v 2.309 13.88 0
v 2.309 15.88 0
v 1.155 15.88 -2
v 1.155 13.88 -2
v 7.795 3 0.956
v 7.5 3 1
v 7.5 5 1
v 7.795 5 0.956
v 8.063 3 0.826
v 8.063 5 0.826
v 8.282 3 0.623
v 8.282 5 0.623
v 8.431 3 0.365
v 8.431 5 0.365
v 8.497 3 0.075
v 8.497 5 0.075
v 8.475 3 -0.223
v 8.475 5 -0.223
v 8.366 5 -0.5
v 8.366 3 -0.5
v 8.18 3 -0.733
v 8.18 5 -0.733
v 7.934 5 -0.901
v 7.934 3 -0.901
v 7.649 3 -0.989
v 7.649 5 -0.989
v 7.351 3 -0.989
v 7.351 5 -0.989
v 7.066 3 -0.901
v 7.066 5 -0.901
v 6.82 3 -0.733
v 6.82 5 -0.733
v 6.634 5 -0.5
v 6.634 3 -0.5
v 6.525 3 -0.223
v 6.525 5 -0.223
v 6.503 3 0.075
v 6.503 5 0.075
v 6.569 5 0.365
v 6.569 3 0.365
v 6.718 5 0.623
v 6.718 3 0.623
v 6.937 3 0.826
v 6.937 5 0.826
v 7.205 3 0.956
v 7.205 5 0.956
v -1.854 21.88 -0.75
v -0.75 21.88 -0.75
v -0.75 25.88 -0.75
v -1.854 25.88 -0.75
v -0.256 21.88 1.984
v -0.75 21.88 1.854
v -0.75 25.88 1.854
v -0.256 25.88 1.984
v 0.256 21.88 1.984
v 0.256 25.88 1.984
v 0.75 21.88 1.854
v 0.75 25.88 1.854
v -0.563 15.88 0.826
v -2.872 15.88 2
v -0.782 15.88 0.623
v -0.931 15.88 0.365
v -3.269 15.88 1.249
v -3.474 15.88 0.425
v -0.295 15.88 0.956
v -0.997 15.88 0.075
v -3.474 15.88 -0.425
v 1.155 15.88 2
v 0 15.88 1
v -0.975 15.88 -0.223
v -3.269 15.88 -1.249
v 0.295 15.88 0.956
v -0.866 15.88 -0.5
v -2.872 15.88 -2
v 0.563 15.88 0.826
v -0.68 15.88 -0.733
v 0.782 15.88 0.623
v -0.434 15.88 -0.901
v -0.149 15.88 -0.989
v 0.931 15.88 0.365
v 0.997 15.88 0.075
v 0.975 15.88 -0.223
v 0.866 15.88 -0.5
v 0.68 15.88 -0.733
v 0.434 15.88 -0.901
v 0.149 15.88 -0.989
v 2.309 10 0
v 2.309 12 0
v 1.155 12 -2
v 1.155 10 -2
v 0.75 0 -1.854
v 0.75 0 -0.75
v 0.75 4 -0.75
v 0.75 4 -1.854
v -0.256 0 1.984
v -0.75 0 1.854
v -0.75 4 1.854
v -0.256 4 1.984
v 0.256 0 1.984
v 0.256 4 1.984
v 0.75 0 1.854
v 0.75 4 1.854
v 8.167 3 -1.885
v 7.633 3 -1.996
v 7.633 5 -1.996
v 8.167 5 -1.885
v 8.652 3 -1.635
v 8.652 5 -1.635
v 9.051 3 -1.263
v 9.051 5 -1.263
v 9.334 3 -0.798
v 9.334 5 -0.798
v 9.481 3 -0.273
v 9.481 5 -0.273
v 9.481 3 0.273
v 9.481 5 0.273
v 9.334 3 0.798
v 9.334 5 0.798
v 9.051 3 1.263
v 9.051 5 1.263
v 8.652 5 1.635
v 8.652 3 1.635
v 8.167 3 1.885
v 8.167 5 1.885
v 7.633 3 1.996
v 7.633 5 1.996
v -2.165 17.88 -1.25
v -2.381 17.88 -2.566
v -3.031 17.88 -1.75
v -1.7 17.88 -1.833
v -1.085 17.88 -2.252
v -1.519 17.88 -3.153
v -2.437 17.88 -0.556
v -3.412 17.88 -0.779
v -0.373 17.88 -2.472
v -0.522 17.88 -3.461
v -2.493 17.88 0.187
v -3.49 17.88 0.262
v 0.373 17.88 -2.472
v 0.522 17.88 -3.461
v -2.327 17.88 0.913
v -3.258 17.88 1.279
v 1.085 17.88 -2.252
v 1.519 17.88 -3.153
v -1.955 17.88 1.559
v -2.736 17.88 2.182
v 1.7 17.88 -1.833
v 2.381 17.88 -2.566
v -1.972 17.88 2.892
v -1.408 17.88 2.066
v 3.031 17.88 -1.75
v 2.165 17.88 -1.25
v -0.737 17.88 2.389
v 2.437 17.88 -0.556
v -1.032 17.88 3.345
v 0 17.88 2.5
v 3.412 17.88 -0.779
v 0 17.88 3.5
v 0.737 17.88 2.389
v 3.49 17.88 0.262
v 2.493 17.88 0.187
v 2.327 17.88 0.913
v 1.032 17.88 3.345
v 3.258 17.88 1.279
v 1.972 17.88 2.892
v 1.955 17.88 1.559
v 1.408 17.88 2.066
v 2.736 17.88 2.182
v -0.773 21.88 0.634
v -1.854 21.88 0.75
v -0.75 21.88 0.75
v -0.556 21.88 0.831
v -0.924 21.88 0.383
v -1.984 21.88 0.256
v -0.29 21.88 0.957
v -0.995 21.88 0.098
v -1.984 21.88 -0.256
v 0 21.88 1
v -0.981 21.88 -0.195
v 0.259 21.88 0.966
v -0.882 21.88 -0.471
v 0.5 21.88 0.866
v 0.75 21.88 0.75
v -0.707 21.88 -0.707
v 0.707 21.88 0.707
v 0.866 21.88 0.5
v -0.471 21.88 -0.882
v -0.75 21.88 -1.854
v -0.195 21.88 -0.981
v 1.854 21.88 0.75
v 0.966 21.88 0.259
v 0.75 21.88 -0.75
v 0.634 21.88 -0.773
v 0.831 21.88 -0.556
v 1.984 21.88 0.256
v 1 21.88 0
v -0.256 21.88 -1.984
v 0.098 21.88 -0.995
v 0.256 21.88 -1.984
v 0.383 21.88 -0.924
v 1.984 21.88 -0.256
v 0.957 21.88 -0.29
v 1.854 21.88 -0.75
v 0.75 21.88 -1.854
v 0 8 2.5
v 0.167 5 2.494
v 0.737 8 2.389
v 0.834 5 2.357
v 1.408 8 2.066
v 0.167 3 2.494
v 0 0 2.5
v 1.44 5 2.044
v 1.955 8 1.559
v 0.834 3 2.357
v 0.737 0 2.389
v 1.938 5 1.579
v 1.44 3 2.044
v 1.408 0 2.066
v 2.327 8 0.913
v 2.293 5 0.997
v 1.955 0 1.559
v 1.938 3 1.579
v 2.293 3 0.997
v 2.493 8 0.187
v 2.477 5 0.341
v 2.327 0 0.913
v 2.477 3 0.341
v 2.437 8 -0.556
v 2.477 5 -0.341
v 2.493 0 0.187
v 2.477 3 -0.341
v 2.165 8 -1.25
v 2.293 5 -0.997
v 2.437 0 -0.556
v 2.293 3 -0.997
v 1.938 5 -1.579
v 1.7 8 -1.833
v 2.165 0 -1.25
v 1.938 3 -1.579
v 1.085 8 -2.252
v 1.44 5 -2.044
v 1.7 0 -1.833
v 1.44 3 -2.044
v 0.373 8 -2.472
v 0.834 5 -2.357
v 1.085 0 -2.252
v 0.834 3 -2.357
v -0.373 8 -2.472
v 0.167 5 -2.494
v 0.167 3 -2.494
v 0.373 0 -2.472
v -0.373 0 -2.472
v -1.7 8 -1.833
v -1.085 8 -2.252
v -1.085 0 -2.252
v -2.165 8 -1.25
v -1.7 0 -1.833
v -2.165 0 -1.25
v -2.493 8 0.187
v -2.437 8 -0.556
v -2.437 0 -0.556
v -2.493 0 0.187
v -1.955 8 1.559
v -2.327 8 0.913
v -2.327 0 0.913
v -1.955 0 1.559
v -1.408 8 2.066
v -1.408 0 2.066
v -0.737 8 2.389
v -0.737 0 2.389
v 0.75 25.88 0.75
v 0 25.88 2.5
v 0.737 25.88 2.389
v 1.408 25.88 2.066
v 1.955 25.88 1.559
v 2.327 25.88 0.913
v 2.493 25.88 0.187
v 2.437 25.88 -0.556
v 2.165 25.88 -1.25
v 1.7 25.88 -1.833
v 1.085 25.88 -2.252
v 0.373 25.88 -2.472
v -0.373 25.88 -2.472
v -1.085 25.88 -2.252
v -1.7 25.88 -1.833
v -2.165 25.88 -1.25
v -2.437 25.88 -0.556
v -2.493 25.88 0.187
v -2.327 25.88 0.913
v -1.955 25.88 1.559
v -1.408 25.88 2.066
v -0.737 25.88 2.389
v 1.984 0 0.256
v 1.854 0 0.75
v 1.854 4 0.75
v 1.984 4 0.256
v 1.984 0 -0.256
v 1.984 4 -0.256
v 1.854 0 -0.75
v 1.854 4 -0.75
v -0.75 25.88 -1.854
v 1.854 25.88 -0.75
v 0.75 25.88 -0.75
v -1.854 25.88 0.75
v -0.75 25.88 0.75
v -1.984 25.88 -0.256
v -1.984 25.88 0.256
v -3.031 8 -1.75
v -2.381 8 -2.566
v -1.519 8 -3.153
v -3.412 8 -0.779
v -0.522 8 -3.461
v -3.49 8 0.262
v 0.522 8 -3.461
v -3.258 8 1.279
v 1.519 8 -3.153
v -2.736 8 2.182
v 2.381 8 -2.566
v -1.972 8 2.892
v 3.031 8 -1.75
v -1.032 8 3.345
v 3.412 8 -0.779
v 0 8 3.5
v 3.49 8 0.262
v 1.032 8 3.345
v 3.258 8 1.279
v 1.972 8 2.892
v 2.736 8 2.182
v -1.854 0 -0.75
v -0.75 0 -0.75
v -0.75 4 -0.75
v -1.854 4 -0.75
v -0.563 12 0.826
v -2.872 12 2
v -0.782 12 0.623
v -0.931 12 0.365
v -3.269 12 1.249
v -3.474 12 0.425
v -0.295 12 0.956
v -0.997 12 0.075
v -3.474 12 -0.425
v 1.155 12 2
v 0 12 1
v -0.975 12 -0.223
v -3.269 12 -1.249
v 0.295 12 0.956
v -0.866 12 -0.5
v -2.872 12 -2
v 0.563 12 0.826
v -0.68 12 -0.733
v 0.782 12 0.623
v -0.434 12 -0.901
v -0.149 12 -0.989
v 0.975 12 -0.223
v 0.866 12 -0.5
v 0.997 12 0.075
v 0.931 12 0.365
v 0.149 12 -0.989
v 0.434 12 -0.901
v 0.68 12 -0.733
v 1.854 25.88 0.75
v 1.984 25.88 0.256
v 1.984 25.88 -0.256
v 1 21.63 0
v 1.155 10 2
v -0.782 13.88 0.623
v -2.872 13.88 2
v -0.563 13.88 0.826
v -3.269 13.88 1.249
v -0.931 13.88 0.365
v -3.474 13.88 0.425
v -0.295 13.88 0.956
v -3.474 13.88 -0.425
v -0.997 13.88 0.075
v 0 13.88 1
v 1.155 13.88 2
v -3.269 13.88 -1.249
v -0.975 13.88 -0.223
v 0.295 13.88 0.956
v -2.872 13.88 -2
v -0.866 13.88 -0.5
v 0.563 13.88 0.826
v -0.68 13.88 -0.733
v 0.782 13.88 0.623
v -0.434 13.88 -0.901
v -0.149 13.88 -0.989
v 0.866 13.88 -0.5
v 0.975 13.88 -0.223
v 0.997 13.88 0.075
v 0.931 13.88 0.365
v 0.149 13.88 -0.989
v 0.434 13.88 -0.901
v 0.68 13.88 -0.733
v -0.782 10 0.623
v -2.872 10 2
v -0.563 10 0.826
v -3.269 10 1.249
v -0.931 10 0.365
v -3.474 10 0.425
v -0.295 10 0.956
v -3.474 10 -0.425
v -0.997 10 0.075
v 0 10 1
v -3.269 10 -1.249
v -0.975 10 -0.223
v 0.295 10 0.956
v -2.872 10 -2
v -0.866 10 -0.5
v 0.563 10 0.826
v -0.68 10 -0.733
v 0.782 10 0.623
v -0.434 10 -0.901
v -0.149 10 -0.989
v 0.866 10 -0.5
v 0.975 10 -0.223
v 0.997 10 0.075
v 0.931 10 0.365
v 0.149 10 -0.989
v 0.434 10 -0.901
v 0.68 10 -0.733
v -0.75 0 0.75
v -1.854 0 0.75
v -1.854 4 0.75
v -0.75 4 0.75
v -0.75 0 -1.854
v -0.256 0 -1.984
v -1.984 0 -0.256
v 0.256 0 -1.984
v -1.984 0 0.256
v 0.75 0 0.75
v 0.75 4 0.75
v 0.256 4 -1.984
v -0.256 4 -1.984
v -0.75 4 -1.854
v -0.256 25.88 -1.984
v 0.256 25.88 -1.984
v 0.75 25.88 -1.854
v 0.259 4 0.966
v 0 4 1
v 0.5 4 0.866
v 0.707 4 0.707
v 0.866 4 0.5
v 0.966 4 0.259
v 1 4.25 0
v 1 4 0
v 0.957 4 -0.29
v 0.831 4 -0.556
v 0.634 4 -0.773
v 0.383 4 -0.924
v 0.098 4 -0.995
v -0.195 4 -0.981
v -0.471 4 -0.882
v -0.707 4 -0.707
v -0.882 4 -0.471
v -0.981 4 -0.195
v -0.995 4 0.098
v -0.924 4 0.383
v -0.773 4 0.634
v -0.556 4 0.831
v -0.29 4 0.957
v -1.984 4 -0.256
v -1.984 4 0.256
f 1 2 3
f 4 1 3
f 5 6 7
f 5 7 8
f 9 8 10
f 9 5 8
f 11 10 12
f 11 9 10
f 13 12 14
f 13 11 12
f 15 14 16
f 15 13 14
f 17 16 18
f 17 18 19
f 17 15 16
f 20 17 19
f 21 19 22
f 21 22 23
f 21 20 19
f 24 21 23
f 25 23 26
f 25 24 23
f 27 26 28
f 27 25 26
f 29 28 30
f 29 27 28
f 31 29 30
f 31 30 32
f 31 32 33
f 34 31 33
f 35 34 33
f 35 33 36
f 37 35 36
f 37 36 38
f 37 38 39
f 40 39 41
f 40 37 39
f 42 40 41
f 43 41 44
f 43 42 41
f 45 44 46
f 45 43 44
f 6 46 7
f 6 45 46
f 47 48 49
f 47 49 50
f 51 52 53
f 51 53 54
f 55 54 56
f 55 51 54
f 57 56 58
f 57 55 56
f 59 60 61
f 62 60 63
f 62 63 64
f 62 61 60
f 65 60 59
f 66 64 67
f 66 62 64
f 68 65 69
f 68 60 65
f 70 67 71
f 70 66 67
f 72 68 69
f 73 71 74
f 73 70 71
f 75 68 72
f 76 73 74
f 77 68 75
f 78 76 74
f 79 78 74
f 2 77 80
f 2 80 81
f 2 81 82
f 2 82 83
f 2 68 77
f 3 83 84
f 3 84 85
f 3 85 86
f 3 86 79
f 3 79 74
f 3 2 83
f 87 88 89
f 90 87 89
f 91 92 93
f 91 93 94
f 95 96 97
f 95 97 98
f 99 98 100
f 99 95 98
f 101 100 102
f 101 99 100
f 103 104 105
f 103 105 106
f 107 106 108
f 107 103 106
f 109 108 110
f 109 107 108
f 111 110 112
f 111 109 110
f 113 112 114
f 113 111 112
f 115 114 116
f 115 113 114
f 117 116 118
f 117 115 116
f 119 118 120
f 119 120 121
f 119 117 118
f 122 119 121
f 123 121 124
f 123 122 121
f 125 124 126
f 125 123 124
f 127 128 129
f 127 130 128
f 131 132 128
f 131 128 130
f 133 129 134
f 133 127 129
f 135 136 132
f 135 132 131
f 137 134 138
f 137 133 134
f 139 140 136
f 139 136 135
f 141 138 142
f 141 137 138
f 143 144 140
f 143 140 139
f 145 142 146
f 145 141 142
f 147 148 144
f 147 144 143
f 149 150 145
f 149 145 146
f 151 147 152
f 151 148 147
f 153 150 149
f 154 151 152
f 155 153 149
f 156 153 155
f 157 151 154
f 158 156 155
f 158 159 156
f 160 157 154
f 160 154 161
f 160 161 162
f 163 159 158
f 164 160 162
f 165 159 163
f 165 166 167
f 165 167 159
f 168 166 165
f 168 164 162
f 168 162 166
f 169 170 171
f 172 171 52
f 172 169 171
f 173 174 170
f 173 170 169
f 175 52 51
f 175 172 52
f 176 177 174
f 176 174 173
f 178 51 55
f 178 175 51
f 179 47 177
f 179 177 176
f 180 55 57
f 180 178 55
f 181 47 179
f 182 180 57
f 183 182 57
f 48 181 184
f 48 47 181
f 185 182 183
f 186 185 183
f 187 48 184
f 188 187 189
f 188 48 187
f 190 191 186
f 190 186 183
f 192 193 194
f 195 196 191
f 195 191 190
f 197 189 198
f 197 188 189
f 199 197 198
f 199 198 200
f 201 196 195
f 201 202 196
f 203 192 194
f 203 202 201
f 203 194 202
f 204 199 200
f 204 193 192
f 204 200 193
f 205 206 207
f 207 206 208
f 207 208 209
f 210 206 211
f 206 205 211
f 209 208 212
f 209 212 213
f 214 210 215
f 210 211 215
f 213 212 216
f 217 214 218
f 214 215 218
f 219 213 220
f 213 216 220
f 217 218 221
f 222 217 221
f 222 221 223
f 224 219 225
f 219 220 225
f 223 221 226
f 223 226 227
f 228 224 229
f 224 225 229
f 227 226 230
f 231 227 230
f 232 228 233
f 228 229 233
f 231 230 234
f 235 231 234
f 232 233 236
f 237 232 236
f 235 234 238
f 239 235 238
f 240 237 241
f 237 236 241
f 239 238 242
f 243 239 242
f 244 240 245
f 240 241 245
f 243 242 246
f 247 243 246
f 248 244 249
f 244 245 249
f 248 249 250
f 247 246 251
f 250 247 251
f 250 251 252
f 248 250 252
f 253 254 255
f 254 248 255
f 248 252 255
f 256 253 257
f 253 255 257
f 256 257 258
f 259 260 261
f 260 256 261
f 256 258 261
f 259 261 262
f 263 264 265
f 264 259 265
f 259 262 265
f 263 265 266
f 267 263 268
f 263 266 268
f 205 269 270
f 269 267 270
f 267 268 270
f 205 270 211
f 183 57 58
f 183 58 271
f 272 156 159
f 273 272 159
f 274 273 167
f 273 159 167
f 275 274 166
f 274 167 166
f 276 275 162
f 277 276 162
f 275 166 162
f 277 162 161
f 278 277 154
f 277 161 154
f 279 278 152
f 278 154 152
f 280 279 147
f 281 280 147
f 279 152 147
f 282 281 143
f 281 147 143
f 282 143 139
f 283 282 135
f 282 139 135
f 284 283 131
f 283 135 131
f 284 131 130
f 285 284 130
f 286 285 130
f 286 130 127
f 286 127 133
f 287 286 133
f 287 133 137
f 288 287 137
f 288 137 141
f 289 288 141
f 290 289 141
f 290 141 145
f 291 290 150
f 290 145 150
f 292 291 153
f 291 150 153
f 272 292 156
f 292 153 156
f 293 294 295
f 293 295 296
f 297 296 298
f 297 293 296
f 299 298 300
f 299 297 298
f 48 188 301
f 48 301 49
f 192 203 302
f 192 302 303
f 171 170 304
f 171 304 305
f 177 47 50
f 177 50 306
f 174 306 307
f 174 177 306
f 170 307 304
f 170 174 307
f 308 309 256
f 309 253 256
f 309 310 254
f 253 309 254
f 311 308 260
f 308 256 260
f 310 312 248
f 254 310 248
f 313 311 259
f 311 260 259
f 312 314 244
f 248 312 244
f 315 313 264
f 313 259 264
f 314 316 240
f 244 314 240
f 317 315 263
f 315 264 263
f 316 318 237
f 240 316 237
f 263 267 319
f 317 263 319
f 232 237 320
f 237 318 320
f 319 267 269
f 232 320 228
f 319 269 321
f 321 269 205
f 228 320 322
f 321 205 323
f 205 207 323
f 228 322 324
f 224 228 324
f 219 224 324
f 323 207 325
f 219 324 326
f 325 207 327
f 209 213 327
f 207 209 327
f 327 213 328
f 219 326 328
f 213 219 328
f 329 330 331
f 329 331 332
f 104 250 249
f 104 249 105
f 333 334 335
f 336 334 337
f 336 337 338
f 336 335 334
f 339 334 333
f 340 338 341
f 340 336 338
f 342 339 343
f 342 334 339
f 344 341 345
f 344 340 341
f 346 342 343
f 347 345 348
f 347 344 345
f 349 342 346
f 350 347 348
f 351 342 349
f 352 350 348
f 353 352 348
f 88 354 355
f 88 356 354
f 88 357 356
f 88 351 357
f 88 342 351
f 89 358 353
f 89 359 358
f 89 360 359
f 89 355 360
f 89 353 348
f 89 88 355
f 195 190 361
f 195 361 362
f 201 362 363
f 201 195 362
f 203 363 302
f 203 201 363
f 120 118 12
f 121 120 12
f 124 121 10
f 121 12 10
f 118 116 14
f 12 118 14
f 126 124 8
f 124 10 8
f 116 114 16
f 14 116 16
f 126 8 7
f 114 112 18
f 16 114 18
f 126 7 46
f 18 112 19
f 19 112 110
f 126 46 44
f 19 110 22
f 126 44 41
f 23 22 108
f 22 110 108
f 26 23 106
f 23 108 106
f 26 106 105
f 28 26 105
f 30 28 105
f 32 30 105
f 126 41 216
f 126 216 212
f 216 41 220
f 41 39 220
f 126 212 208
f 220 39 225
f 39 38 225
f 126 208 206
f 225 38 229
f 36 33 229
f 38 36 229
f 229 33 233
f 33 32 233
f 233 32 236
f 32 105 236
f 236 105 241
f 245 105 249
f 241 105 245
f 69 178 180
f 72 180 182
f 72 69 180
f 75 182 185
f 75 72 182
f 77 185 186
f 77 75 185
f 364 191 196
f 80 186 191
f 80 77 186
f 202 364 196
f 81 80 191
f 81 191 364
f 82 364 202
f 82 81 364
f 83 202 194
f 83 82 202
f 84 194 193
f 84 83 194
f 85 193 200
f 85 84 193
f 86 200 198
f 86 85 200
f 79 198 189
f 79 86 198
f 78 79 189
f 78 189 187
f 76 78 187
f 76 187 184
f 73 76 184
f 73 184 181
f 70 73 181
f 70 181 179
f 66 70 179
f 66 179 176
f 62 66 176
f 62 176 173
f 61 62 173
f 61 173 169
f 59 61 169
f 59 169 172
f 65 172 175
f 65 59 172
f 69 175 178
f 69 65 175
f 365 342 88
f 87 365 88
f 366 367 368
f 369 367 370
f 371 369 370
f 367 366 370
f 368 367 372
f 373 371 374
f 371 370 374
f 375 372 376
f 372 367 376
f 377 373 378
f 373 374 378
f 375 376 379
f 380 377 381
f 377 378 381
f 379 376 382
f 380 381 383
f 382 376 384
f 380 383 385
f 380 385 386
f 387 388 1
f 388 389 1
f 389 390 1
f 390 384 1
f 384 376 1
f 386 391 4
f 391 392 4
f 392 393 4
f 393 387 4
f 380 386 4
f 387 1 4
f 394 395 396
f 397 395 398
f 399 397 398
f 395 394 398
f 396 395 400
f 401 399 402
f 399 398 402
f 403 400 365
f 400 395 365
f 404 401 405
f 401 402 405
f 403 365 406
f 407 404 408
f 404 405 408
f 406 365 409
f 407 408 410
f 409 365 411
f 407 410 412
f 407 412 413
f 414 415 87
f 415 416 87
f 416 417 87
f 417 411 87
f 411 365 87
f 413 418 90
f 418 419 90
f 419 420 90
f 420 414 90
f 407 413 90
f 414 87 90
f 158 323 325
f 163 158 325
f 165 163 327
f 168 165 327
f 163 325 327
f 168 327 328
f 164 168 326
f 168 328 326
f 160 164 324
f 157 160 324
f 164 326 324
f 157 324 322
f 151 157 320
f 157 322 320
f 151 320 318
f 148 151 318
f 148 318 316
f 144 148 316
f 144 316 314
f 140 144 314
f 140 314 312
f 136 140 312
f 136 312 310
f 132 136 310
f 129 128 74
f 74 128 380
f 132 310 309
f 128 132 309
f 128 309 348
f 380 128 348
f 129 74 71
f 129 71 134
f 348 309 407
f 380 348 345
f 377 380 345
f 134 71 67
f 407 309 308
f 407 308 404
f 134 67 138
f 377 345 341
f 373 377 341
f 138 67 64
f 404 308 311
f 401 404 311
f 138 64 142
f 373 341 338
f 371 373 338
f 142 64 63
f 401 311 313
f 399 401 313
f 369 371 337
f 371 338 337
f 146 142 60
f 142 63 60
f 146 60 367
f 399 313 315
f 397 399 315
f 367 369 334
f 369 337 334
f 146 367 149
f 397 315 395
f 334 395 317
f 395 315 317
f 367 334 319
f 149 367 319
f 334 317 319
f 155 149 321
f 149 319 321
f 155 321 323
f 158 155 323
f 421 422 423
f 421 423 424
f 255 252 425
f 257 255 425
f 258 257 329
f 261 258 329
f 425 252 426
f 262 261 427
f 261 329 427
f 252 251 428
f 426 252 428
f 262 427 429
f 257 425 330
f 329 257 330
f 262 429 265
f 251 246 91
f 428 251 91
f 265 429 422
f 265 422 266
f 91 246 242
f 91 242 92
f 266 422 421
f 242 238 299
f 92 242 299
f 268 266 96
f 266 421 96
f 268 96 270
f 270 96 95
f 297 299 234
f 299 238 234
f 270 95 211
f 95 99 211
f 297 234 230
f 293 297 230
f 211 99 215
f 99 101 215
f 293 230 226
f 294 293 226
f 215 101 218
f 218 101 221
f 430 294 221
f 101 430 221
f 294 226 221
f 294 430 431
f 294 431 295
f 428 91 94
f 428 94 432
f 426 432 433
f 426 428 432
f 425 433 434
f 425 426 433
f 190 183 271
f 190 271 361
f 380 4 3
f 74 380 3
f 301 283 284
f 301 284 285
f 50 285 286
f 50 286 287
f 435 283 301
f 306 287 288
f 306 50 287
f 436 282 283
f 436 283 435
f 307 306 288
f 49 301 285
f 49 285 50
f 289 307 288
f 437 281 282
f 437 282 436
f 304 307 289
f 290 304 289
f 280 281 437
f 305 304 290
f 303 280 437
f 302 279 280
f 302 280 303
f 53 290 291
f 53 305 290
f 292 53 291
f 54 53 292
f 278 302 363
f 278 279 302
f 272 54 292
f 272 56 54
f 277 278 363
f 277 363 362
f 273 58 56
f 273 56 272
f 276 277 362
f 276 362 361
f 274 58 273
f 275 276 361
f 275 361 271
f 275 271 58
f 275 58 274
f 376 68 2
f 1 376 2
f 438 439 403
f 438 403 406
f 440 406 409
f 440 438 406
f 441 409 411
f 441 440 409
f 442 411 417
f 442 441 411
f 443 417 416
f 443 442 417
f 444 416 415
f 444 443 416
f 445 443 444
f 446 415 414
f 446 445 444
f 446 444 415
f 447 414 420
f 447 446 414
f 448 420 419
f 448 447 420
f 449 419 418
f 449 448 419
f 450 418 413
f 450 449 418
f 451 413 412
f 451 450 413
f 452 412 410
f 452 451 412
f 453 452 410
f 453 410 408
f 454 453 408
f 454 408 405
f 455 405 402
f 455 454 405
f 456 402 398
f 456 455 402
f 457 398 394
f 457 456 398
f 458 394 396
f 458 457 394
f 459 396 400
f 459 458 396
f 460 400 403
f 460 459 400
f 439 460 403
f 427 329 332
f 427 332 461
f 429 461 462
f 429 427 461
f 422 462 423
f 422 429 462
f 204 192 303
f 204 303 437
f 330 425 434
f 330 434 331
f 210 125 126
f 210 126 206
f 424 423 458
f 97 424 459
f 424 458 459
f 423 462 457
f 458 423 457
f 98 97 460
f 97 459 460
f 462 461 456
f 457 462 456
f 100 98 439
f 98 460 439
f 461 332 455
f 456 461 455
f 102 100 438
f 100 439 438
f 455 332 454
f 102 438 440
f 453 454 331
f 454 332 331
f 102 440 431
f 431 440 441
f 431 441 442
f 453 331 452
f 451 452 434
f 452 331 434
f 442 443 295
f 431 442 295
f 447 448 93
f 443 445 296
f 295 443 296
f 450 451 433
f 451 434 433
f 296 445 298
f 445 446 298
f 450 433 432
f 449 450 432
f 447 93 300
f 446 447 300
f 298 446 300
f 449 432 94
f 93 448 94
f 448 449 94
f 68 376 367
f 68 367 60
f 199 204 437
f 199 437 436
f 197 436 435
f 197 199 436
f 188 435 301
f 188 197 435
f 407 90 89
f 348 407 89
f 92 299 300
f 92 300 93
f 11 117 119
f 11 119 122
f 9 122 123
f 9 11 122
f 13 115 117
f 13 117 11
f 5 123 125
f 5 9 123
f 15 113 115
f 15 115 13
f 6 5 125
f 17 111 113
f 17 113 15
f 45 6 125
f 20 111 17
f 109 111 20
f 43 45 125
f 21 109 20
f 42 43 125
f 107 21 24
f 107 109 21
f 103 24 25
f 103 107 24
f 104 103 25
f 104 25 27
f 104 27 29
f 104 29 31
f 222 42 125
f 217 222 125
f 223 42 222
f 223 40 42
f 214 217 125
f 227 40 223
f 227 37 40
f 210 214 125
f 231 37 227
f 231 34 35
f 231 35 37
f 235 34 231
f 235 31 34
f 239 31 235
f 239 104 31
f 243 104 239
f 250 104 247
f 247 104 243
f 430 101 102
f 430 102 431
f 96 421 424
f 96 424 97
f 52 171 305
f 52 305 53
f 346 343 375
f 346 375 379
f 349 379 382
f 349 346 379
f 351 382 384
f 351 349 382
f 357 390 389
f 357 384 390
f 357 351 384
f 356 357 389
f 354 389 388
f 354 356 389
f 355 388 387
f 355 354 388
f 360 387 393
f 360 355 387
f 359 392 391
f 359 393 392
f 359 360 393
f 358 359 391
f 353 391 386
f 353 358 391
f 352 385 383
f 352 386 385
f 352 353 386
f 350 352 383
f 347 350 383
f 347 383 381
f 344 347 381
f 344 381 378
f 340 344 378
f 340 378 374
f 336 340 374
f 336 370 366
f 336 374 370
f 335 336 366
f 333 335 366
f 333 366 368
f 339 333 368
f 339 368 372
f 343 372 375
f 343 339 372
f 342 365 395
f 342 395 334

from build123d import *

# Parameters (mm, degrees)
SKETCH_1_R           = 2.5
EXTRUDE_1_DEPTH      = 25.88
EXTRUDE_START        = 3
SKETCH_2_R           = 1
EXTRUDE_2_DEPTH      = 2
CUT_EXTRUDE_1_DEPTH  = 4
CUT_EXTRUDE_START    = 21.88
CUT_EXTRUDE_2_DEPTH  = 4
SKETCH_6_R           = 0.25
CUT_EXTRUDE_3_DEPTH  = 0.25
CUT_EXTRUDE_START_2  = 4.25
SKETCH_7_R           = 0.25
CUT_EXTRUDE_4_DEPTH  = 0.25
EXTRUDE_START_2      = 8
SKETCH_17_R          = 3.5
EXTRUDE_5_DEPTH      = 9.88
SKETCH_18_R          = 1
CUT_EXTRUDE_11_DEPTH = 10
CUT_EXTRUDE_START_3  = 15.88
SKETCH_19_R          = 1
CUT_EXTRUDE_12_DEPTH = 10
SKETCH_22_W          = 4
SKETCH_22_H          = 2
CUT_EXTRUDE_13_DEPTH = 10
CUT_EXTRUDE_14_DEPTH = 2
CUT_EXTRUDE_START_4  = 12
CUT_EXTRUDE_15_DEPTH = 2
SKETCH_25_R          = 1
CUT_EXTRUDE_16_DEPTH = 28.789825476


with BuildPart() as part:
    # 草图1 → 凸台-拉伸1 (new body)
    with BuildSketch(Plane(origin=(0, 0, 0), x_dir=(1, 0, 0), z_dir=(0, 1, 0))):
        with Locations(Location((0, 0, 0), (0, 0, 270))):
            Circle(SKETCH_1_R)
    extrude(amount=EXTRUDE_1_DEPTH)

    # 草图2 → 凸台-拉伸2 (add)
    with BuildSketch(Plane(origin=(0, 0, 0), x_dir=(1, 0, 0), z_dir=(0, 1, 0)).offset(EXTRUDE_START)):
        with BuildLine():
            Line((0.166666667, 2.494438258), (7.633333333, 1.995550606))
            ThreePointArc((7.633333333, 1.995550606), (9.5, 0), (7.633333333, -1.995550606))
            Line((7.633333333, -1.995550606), (0.166666667, -2.494438258))
            ThreePointArc((0.166666667, -2.494438258), (-2.5, 0), (0.166666667, 2.494438258))
        make_face()
        with Locations(Location((7.5, 0, 0), (0, 0, 270))):
            Circle(SKETCH_2_R, mode=Mode.SUBTRACT)
    extrude(amount=EXTRUDE_2_DEPTH)

    # 草图3 → 切除-拉伸1 (cut)
    with BuildSketch(Plane(origin=(0, 0, 0), x_dir=(1, 0, 0), z_dir=(0, 1, 0))):
        with BuildLine():
            Line((-1.854049622, -0.75), (-0.75, -0.75))
            Line((-0.75, -0.75), (-0.75, -1.854049622))
            ThreePointArc((-0.75, -1.854049622), (0, -2), (0.75, -1.854049622))
            Line((0.75, -1.854049622), (0.75, -0.75))
            Line((0.75, -0.75), (1.854049622, -0.75))
            ThreePointArc((1.854049622, -0.75), (2, 0), (1.854049622, 0.75))
            Line((1.854049622, 0.75), (0.75, 0.75))
            Line((0.75, 0.75), (0.75, 1.854049622))
            ThreePointArc((0.75, 1.854049622), (0, 2), (-0.75, 1.854049622))
            Line((-0.75, 1.854049622), (-0.75, 0.75))
            Line((-0.75, 0.75), (-1.854049622, 0.75))
            ThreePointArc((-1.854049622, 0.75), (-2, 0), (-1.854049622, -0.75))
        make_face()
    extrude(amount=CUT_EXTRUDE_1_DEPTH, mode=Mode.SUBTRACT)

    # 草图5 → 切除-拉伸2 (cut)
    with BuildSketch(Plane(origin=(0, 0, 0), x_dir=(1, 0, 0), z_dir=(0, 1, 0)).offset(CUT_EXTRUDE_START)):
        with BuildLine():
            Line((1.854049622, 0.75), (0.75, 0.75))
            Line((0.75, 0.75), (0.75, 1.854049622))
            ThreePointArc((0.75, 1.854049622), (0, 2), (-0.75, 1.854049622))
            Line((-0.75, 1.854049622), (-0.75, 0.75))
            Line((-0.75, 0.75), (-1.854049622, 0.75))
            ThreePointArc((-1.854049622, 0.75), (-2, 0), (-1.854049622, -0.75))
            Line((-1.854049622, -0.75), (-0.75, -0.75))
            Line((-0.75, -0.75), (-0.75, -1.854049622))
            ThreePointArc((-0.75, -1.854049622), (0, -2), (0.75, -1.854049622))
            Line((0.75, -1.854049622), (0.75, -0.75))
            Line((0.75, -0.75), (1.854049622, -0.75))
            ThreePointArc((1.854049622, -0.75), (2, 0), (1.854049622, 0.75))
        make_face()
    extrude(amount=CUT_EXTRUDE_2_DEPTH, mode=Mode.SUBTRACT)

    # 草图6 → 切除-拉伸3 (cut)
    with BuildSketch(Plane(origin=(0, 0, 0), x_dir=(1, 0, 0), z_dir=(0, 1, 0)).offset(CUT_EXTRUDE_START)):
        with Locations(Location((0.75, 0, 0), (0, 0, 270))):
            Circle(SKETCH_6_R)
    extrude(amount=-CUT_EXTRUDE_3_DEPTH, mode=Mode.SUBTRACT)

    # 草图7 → 切除-拉伸4 (cut)
    with BuildSketch(Plane(origin=(0, 0, 0), x_dir=(1, 0, 0), z_dir=(0, 1, 0)).offset(CUT_EXTRUDE_START_2)):
        with Locations(Location((0.75, 0, 0), (0, 0, 270))):
            Circle(SKETCH_7_R)
    extrude(amount=-CUT_EXTRUDE_4_DEPTH, mode=Mode.SUBTRACT)

    # 草图17 → 凸台-拉伸5 (add)
    with BuildSketch(Plane(origin=(0, 0, 0), x_dir=(1, 0, 0), z_dir=(0, 1, 0)).offset(EXTRUDE_START_2)):
        with Locations(Location((0, 0, 0), (0, 0, 270))):
            Circle(SKETCH_17_R)
    extrude(amount=EXTRUDE_5_DEPTH)

    # 草图18 → 切除-拉伸11 (cut)
    with BuildSketch(Plane(origin=(0, 0, 0), x_dir=(1, 0, 0), z_dir=(0, 1, 0))):
        with Locations(Location((0, 0, 0), (0, 0, 270))):
            Circle(SKETCH_18_R)
    extrude(amount=CUT_EXTRUDE_11_DEPTH, mode=Mode.SUBTRACT)

    # 草图19 → 切除-拉伸12 (cut)
    with BuildSketch(Plane(origin=(0, 0, 0), x_dir=(1, 0, 0), z_dir=(0, 1, 0)).offset(CUT_EXTRUDE_START_3)):
        with Locations(Location((0, 0, 0), (0, 0, 270))):
            Circle(SKETCH_19_R)
    extrude(amount=CUT_EXTRUDE_12_DEPTH, mode=Mode.SUBTRACT)

    # 草图22 → 切除-拉伸13 (cut)
    with BuildSketch(Plane(origin=(0, 0, 0), x_dir=(0, 0, -1), z_dir=(1, 0, 0))):
        with Locations((0, 14.88)):
            Rectangle(SKETCH_22_W, SKETCH_22_H)
        with Locations((0, 11)):
            Rectangle(SKETCH_22_W, SKETCH_22_H)
    extrude(amount=-CUT_EXTRUDE_13_DEPTH, mode=Mode.SUBTRACT)

    # 草图23 → 切除-拉伸14 (cut)
    with BuildSketch(Plane(origin=(0, 0, 0), x_dir=(1, 0, 0), z_dir=(0, 1, 0)).offset(CUT_EXTRUDE_START_3)):
        Polygon((-2.309401077, 0), (-1.154700538, -2), (1.154700538, -2), (2.309401077, 0), (1.154700538, 2), (-1.154700538, 2), align=None)
    extrude(amount=-CUT_EXTRUDE_14_DEPTH, mode=Mode.SUBTRACT)

    # 草图24 → 切除-拉伸15 (cut)
    with BuildSketch(Plane(origin=(0, 0, 0), x_dir=(1, 0, 0), z_dir=(0, 1, 0)).offset(CUT_EXTRUDE_START_4)):
        Polygon((-2.309401077, 0), (-1.154700538, -2), (1.154700538, -2), (2.309401077, 0), (1.154700538, 2), (-1.154700538, 2), align=None)
    extrude(amount=-CUT_EXTRUDE_15_DEPTH, mode=Mode.SUBTRACT)

    # 草图25 → 切除-拉伸16 (cut, through all)
    with BuildSketch(Plane(origin=(0, 0, 0), x_dir=(1, 0, 0), z_dir=(0, 1, 0))):
        with Locations(Location((0, 0, 0), (0, 0, 270))):
            Circle(SKETCH_25_R)
    extrude(amount=CUT_EXTRUDE_16_DEPTH, mode=Mode.SUBTRACT)


solid = part.part
